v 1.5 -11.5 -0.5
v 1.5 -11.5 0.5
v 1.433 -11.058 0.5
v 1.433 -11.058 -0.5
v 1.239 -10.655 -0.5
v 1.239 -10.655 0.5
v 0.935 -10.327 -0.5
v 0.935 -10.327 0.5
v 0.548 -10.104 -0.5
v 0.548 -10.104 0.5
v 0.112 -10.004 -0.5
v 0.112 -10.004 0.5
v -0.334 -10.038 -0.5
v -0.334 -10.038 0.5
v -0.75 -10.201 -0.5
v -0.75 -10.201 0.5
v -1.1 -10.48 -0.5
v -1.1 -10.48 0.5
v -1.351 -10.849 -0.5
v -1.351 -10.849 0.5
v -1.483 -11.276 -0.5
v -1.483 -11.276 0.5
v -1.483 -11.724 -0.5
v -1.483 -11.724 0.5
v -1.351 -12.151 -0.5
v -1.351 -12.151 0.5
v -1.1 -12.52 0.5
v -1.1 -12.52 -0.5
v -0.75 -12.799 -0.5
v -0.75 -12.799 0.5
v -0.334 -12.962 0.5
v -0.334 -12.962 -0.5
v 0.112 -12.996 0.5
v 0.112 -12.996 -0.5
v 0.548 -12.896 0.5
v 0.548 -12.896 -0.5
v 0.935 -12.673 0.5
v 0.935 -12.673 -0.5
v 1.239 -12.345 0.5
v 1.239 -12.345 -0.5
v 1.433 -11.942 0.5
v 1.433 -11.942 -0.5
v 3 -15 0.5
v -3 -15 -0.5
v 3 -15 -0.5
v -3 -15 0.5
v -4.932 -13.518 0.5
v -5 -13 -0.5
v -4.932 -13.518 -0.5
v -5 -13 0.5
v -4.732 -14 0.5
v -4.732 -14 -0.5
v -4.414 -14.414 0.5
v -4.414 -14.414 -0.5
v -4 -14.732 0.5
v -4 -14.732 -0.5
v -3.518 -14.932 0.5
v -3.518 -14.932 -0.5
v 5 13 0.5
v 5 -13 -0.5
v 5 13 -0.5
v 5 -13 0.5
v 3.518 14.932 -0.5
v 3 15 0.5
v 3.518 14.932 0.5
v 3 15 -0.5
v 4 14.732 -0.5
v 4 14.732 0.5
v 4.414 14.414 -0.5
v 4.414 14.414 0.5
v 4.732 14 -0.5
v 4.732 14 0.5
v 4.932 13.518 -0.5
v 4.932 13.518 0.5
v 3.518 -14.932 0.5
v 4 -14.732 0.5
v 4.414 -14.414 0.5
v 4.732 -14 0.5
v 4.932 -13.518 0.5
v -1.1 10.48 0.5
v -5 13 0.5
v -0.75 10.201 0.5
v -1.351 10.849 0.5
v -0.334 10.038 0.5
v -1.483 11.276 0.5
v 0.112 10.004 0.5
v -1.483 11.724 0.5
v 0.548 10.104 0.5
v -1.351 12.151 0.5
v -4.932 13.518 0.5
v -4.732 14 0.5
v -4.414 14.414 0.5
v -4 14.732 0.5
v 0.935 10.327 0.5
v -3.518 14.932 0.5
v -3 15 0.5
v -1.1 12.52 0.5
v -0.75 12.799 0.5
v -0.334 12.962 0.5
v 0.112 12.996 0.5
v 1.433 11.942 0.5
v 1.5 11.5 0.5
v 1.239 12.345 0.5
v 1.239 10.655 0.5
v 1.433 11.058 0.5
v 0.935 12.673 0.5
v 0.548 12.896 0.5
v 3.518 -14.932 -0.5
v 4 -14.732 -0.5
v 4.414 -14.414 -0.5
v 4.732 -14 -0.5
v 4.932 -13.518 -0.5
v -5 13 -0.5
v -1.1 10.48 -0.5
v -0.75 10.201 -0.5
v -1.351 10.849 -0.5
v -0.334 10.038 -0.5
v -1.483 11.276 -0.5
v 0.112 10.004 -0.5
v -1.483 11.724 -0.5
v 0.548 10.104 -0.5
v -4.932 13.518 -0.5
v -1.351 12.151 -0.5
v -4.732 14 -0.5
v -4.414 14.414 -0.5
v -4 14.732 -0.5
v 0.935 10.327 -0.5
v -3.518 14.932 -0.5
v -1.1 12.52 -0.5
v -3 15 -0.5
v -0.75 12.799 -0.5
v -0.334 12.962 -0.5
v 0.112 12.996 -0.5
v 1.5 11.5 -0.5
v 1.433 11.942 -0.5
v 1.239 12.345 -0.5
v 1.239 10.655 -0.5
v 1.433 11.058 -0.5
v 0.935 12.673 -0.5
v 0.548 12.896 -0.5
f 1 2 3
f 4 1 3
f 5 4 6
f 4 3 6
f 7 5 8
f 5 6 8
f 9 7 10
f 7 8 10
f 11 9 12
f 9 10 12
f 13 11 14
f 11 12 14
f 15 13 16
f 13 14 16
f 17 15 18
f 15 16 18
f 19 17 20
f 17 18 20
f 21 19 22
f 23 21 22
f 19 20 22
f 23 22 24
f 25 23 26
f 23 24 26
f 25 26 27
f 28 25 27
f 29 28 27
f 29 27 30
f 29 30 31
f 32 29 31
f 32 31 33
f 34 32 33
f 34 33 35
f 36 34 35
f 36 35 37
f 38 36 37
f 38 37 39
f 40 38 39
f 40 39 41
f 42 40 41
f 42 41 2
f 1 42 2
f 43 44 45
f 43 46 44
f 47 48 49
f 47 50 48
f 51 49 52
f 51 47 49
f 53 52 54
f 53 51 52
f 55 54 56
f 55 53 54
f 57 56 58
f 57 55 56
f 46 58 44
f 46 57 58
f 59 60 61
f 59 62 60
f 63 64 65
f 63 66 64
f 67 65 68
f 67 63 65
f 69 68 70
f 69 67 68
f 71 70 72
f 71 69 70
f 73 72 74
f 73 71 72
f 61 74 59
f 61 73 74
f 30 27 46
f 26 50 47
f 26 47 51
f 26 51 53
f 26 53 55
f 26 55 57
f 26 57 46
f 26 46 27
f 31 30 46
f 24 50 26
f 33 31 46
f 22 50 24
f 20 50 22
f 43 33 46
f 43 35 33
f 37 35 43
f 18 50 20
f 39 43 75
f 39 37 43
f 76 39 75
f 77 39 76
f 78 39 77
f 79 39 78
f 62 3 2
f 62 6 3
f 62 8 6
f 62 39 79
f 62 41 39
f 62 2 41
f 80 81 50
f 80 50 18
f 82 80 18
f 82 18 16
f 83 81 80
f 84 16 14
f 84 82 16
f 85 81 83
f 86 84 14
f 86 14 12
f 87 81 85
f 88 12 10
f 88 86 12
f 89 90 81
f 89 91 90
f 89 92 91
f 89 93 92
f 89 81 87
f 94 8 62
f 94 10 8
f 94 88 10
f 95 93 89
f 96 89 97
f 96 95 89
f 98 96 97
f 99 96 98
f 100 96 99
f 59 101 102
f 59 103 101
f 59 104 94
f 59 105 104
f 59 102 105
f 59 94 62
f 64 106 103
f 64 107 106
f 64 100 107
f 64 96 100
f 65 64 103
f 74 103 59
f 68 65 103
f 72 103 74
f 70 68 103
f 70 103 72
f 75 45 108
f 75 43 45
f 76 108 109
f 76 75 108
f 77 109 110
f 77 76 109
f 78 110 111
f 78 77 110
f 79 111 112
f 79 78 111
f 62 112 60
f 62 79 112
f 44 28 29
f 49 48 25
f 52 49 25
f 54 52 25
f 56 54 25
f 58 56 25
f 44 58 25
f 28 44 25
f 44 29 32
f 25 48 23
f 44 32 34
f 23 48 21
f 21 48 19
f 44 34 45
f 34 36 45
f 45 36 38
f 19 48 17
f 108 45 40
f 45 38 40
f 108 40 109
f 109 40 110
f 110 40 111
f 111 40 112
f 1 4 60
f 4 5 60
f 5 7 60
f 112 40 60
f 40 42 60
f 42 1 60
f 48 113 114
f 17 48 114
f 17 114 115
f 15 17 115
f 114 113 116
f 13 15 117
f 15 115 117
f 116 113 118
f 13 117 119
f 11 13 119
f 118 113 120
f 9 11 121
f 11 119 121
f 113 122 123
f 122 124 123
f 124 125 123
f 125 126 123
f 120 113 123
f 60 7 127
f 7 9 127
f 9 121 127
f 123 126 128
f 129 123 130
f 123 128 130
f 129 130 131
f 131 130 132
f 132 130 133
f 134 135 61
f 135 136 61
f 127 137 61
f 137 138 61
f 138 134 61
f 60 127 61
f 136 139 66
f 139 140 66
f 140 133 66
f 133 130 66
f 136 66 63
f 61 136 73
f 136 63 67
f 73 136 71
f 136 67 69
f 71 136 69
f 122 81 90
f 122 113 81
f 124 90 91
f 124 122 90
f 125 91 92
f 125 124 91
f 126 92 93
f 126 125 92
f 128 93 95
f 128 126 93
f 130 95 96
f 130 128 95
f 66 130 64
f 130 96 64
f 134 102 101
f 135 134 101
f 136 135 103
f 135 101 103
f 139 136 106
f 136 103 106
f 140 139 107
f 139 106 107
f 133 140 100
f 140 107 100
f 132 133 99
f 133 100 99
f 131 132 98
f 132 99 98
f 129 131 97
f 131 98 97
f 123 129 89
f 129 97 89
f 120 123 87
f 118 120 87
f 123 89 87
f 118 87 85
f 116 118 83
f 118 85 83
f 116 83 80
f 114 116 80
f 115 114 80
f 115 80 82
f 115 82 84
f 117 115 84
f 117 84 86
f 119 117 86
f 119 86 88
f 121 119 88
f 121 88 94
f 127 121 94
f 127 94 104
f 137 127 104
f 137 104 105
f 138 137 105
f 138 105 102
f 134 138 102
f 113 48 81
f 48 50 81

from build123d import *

# Parameters (mm, degrees)
SKETCH_1_W          = 10
SKETCH_1_H          = 30
EXTRUDE_1_DEPTH     = 0.5
SKETCH_2_R          = 1.5
CUT_EXTRUDE_1_DEPTH = 10
FILLET_1_R          = 2


with BuildPart() as part:
    # 草图1 → 凸台-拉伸1 (new, symmetric)
    with BuildSketch(Plane.XY):
        Rectangle(SKETCH_1_W, SKETCH_1_H)
    extrude(amount=EXTRUDE_1_DEPTH, both=True)

    # 草图2 → 切除-拉伸1 (cut)
    with BuildSketch(Plane.XY.offset(0.5)):
        with Locations((0, 11.5)):
            Circle(SKETCH_2_R)
        with Locations((0, -11.5)):
            Circle(SKETCH_2_R)
    extrude(amount=-CUT_EXTRUDE_1_DEPTH, mode=Mode.SUBTRACT)

    # 圆角1
    fillet_1_edges = [part.edges().sort_by_distance(p)[0] for p in [
        (5, -15, 0),
        (-5, -15, 0),
        (-5, 15, 0),
        (5, 15, 0),
    ]]
    fillet(fillet_1_edges, radius=FILLET_1_R)


solid = part.part
